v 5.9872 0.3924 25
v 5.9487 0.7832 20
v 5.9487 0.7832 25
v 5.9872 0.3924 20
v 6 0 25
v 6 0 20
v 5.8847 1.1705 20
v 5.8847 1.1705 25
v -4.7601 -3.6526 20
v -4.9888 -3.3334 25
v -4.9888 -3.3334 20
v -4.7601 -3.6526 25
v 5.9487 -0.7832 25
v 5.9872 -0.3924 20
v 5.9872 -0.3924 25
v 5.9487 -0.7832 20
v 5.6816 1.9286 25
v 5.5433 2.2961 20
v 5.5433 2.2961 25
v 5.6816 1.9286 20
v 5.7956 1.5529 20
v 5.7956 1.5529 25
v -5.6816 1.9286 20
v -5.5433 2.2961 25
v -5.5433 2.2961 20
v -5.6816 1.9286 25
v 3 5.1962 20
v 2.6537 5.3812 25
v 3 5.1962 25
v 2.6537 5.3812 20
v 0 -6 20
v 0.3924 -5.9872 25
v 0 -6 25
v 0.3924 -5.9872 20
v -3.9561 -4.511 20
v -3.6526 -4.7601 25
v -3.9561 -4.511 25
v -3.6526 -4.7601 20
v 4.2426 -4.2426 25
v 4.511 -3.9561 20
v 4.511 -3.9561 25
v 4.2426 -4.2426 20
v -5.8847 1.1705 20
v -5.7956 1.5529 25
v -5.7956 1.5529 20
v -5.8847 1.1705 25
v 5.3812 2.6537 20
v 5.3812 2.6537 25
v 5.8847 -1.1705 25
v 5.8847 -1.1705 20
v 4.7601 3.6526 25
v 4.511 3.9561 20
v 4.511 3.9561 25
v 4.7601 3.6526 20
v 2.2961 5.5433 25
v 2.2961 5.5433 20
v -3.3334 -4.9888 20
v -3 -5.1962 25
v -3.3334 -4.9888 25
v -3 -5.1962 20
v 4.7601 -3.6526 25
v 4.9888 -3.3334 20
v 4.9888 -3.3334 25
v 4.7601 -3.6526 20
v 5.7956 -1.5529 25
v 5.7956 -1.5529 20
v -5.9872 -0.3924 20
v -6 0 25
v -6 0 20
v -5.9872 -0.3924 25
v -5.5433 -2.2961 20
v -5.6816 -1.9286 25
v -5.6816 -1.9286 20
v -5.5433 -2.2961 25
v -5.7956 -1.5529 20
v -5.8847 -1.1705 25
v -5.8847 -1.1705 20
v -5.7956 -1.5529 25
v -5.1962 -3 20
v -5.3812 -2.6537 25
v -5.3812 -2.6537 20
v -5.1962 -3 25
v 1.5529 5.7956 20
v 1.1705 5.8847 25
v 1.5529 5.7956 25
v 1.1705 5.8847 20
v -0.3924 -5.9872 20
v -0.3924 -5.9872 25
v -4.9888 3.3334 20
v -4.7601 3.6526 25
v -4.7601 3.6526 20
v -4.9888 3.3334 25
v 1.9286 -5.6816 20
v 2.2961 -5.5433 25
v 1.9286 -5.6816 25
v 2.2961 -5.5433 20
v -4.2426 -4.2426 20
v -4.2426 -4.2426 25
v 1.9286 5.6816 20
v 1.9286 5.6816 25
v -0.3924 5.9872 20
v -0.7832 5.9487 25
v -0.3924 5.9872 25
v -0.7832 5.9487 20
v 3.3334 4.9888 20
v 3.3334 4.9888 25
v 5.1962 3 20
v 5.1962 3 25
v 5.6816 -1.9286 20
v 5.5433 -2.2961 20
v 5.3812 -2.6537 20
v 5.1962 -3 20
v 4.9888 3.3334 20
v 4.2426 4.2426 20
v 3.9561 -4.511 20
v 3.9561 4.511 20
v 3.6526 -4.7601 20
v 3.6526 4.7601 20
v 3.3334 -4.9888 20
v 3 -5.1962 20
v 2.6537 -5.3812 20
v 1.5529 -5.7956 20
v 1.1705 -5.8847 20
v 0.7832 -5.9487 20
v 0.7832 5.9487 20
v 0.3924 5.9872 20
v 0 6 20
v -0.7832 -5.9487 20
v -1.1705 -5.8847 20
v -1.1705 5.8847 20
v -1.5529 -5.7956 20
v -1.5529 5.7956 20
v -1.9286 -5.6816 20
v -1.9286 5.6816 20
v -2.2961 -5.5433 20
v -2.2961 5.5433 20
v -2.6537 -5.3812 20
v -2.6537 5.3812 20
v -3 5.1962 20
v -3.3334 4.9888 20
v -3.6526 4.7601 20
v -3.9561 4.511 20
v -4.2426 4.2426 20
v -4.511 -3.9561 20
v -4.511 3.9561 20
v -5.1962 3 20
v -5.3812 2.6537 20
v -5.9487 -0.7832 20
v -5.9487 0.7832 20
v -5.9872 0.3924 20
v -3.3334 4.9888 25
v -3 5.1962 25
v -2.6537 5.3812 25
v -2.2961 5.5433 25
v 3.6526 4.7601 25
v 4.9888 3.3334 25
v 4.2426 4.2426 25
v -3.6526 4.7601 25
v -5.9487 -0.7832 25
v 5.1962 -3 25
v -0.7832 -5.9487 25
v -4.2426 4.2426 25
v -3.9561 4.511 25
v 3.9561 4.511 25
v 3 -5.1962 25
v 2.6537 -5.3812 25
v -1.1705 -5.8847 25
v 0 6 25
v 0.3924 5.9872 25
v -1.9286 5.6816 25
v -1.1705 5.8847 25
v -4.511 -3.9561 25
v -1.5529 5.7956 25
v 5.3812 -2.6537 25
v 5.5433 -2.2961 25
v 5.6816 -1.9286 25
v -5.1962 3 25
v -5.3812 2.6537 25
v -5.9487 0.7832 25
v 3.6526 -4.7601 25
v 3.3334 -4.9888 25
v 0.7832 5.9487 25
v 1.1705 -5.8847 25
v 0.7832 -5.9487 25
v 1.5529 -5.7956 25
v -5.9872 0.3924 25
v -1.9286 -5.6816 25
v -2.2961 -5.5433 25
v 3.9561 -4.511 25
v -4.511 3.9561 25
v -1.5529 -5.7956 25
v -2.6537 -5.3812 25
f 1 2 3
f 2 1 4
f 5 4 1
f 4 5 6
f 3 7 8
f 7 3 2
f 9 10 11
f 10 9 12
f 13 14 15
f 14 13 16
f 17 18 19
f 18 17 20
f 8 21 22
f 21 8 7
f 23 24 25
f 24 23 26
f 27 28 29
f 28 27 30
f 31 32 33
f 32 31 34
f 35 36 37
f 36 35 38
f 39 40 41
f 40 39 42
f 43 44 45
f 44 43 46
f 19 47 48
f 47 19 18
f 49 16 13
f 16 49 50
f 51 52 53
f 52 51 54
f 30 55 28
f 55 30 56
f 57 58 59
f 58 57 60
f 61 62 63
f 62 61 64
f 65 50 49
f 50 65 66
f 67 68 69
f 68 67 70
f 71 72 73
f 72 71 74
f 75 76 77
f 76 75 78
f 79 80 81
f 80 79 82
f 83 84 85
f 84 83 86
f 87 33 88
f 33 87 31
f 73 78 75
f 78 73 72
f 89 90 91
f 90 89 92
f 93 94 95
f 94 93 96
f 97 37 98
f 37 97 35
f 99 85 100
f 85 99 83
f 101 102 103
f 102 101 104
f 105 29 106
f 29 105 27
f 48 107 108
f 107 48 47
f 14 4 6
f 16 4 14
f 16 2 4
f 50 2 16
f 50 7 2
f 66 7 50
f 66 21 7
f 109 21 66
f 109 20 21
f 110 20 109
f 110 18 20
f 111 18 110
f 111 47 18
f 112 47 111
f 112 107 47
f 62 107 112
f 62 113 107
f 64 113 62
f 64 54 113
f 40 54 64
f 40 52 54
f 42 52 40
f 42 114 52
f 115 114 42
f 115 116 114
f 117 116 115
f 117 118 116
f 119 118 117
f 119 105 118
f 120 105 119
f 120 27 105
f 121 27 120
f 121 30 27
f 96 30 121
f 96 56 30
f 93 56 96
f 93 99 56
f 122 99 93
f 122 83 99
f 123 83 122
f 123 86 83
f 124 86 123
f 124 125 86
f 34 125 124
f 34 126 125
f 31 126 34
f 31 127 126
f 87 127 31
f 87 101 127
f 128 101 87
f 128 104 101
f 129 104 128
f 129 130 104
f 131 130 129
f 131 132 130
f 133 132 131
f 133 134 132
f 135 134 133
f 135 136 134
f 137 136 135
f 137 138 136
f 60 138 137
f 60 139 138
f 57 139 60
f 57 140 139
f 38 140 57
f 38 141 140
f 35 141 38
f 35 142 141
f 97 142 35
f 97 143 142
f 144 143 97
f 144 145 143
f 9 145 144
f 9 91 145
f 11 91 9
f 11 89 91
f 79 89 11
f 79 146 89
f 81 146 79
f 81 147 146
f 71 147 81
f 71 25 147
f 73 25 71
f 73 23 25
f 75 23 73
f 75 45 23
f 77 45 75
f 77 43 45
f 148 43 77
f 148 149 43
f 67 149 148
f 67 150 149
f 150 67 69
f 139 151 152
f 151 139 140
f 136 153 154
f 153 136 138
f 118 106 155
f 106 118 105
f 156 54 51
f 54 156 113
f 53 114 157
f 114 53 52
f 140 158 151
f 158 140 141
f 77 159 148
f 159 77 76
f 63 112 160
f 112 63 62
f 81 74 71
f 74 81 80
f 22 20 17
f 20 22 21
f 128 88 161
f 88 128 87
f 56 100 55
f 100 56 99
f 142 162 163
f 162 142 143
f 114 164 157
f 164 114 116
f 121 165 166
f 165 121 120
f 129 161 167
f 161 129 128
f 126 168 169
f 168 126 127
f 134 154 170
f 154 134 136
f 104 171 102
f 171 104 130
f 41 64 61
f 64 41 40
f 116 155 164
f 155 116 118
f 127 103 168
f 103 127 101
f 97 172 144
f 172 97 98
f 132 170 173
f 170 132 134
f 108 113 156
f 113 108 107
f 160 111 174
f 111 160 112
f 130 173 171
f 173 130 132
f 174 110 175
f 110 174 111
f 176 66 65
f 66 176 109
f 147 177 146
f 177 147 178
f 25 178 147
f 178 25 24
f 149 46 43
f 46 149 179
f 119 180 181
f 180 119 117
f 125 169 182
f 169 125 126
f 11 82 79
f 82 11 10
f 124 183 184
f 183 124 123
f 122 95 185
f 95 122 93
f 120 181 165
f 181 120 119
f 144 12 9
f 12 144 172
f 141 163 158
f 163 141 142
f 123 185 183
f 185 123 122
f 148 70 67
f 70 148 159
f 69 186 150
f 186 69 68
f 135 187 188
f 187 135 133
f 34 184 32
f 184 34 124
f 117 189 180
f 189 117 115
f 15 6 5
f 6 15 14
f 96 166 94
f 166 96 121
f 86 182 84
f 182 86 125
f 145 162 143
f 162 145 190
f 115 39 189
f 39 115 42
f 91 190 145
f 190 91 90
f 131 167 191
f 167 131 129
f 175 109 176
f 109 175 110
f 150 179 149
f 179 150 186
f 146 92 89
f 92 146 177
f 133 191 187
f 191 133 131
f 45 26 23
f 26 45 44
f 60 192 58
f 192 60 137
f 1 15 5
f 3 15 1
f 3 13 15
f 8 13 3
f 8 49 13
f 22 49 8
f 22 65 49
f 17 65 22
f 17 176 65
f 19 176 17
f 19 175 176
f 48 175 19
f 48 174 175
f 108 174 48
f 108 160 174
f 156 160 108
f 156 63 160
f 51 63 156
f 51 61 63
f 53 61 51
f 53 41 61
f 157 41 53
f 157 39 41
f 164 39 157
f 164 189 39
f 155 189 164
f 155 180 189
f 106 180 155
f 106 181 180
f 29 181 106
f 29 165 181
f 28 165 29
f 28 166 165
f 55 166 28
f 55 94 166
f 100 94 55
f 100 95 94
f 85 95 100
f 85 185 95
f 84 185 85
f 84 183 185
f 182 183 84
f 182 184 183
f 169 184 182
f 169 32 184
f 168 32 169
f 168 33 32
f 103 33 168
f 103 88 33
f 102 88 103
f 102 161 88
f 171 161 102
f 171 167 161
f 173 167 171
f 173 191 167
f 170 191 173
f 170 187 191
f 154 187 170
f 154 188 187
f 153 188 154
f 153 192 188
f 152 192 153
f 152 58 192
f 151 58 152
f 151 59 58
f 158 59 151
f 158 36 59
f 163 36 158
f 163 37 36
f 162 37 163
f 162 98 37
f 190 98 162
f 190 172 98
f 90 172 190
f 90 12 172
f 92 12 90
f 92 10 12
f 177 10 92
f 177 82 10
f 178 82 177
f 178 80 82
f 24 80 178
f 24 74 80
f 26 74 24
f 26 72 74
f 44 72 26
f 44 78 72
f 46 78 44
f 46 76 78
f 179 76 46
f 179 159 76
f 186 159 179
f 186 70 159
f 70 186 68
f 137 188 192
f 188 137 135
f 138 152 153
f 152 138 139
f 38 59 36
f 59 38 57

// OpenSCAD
// Hose-barb reducer: joins 8 mm ID tubing to 5 mm ID tubing
// Print orientation: standing upright along +Z, centred on origin in X/Y

// ---------------- Parameters ----------------
reducer_d      = 10;   // bore diameter (through-hole)
tube8_d        = 8;    // inner diameter of first tubing set
tube5_d        = 5;    // inner diameter of second tubing set
barb8_h        = 10;   // height of each 8 mm barb
barb8_od_bot   = 7.5;  // outer diameter of 8 mm barb at bottom
barb8_od_top   = 9.5;  // outer diameter of 8 mm barb at top
barb8_step     = 7.5;  // outer diameter after sawtooth step
collar_d       = 12;   // diameter of collar (z = 20 to 25)
barb5_h        = 8;    // height of each 5 mm barb
barb5_od_bot   = 6.5;  // outer diameter of 5 mm barb at bottom
barb5_od_top   = 5.0;  // outer diameter of 5 mm barb at top
barb5_step     = 6.5;  // outer diameter after sawtooth step
eps            = 0.5;  // overshoot for clean boolean cuts
$fn            = 96;   // curve resolution

// ---------------- Model ----------------
difference() {
    union() {
        // 8 mm tubing section: two stacked barbs with sawtooth profile
        for (z = [0, barb8_h])
            translate([0, 0, z])
                linear_extrude(height = reducer_d + 2 * eps, center = true)
                    polygon([
                        [0, 0],
                        [barb8_od_bot / 2, barb8_h],
                        [barb8_od_top / 2, 0],
                        [barb8_step / 2, barb8_h]
                    ]);

        // collar (z = 20 to 25)
        translate([0, 0, 20])
            cylinder(d = collar_d, h = 5);

        // 5 mm tubing section: two stacked barbs with sawtooth profile
        for (z = [25, 25 + barb5_h])
            translate([0, 0, z])
                linear_extrude(height = reducer_d + 2 * eps, center = true)
                    polygon([
                        [0, 0],
                        [barb5_od_bot / 2, barb5_h],
                        [barb5_od_top / 2, 0],
                        [barb5_step / 2, barb5_h]
                    ]);
    }

    // full-length bore
    translate([0, 0, -eps])
        cylinder(d = reducer_d, h = reducer_d + 2 * eps);
}
